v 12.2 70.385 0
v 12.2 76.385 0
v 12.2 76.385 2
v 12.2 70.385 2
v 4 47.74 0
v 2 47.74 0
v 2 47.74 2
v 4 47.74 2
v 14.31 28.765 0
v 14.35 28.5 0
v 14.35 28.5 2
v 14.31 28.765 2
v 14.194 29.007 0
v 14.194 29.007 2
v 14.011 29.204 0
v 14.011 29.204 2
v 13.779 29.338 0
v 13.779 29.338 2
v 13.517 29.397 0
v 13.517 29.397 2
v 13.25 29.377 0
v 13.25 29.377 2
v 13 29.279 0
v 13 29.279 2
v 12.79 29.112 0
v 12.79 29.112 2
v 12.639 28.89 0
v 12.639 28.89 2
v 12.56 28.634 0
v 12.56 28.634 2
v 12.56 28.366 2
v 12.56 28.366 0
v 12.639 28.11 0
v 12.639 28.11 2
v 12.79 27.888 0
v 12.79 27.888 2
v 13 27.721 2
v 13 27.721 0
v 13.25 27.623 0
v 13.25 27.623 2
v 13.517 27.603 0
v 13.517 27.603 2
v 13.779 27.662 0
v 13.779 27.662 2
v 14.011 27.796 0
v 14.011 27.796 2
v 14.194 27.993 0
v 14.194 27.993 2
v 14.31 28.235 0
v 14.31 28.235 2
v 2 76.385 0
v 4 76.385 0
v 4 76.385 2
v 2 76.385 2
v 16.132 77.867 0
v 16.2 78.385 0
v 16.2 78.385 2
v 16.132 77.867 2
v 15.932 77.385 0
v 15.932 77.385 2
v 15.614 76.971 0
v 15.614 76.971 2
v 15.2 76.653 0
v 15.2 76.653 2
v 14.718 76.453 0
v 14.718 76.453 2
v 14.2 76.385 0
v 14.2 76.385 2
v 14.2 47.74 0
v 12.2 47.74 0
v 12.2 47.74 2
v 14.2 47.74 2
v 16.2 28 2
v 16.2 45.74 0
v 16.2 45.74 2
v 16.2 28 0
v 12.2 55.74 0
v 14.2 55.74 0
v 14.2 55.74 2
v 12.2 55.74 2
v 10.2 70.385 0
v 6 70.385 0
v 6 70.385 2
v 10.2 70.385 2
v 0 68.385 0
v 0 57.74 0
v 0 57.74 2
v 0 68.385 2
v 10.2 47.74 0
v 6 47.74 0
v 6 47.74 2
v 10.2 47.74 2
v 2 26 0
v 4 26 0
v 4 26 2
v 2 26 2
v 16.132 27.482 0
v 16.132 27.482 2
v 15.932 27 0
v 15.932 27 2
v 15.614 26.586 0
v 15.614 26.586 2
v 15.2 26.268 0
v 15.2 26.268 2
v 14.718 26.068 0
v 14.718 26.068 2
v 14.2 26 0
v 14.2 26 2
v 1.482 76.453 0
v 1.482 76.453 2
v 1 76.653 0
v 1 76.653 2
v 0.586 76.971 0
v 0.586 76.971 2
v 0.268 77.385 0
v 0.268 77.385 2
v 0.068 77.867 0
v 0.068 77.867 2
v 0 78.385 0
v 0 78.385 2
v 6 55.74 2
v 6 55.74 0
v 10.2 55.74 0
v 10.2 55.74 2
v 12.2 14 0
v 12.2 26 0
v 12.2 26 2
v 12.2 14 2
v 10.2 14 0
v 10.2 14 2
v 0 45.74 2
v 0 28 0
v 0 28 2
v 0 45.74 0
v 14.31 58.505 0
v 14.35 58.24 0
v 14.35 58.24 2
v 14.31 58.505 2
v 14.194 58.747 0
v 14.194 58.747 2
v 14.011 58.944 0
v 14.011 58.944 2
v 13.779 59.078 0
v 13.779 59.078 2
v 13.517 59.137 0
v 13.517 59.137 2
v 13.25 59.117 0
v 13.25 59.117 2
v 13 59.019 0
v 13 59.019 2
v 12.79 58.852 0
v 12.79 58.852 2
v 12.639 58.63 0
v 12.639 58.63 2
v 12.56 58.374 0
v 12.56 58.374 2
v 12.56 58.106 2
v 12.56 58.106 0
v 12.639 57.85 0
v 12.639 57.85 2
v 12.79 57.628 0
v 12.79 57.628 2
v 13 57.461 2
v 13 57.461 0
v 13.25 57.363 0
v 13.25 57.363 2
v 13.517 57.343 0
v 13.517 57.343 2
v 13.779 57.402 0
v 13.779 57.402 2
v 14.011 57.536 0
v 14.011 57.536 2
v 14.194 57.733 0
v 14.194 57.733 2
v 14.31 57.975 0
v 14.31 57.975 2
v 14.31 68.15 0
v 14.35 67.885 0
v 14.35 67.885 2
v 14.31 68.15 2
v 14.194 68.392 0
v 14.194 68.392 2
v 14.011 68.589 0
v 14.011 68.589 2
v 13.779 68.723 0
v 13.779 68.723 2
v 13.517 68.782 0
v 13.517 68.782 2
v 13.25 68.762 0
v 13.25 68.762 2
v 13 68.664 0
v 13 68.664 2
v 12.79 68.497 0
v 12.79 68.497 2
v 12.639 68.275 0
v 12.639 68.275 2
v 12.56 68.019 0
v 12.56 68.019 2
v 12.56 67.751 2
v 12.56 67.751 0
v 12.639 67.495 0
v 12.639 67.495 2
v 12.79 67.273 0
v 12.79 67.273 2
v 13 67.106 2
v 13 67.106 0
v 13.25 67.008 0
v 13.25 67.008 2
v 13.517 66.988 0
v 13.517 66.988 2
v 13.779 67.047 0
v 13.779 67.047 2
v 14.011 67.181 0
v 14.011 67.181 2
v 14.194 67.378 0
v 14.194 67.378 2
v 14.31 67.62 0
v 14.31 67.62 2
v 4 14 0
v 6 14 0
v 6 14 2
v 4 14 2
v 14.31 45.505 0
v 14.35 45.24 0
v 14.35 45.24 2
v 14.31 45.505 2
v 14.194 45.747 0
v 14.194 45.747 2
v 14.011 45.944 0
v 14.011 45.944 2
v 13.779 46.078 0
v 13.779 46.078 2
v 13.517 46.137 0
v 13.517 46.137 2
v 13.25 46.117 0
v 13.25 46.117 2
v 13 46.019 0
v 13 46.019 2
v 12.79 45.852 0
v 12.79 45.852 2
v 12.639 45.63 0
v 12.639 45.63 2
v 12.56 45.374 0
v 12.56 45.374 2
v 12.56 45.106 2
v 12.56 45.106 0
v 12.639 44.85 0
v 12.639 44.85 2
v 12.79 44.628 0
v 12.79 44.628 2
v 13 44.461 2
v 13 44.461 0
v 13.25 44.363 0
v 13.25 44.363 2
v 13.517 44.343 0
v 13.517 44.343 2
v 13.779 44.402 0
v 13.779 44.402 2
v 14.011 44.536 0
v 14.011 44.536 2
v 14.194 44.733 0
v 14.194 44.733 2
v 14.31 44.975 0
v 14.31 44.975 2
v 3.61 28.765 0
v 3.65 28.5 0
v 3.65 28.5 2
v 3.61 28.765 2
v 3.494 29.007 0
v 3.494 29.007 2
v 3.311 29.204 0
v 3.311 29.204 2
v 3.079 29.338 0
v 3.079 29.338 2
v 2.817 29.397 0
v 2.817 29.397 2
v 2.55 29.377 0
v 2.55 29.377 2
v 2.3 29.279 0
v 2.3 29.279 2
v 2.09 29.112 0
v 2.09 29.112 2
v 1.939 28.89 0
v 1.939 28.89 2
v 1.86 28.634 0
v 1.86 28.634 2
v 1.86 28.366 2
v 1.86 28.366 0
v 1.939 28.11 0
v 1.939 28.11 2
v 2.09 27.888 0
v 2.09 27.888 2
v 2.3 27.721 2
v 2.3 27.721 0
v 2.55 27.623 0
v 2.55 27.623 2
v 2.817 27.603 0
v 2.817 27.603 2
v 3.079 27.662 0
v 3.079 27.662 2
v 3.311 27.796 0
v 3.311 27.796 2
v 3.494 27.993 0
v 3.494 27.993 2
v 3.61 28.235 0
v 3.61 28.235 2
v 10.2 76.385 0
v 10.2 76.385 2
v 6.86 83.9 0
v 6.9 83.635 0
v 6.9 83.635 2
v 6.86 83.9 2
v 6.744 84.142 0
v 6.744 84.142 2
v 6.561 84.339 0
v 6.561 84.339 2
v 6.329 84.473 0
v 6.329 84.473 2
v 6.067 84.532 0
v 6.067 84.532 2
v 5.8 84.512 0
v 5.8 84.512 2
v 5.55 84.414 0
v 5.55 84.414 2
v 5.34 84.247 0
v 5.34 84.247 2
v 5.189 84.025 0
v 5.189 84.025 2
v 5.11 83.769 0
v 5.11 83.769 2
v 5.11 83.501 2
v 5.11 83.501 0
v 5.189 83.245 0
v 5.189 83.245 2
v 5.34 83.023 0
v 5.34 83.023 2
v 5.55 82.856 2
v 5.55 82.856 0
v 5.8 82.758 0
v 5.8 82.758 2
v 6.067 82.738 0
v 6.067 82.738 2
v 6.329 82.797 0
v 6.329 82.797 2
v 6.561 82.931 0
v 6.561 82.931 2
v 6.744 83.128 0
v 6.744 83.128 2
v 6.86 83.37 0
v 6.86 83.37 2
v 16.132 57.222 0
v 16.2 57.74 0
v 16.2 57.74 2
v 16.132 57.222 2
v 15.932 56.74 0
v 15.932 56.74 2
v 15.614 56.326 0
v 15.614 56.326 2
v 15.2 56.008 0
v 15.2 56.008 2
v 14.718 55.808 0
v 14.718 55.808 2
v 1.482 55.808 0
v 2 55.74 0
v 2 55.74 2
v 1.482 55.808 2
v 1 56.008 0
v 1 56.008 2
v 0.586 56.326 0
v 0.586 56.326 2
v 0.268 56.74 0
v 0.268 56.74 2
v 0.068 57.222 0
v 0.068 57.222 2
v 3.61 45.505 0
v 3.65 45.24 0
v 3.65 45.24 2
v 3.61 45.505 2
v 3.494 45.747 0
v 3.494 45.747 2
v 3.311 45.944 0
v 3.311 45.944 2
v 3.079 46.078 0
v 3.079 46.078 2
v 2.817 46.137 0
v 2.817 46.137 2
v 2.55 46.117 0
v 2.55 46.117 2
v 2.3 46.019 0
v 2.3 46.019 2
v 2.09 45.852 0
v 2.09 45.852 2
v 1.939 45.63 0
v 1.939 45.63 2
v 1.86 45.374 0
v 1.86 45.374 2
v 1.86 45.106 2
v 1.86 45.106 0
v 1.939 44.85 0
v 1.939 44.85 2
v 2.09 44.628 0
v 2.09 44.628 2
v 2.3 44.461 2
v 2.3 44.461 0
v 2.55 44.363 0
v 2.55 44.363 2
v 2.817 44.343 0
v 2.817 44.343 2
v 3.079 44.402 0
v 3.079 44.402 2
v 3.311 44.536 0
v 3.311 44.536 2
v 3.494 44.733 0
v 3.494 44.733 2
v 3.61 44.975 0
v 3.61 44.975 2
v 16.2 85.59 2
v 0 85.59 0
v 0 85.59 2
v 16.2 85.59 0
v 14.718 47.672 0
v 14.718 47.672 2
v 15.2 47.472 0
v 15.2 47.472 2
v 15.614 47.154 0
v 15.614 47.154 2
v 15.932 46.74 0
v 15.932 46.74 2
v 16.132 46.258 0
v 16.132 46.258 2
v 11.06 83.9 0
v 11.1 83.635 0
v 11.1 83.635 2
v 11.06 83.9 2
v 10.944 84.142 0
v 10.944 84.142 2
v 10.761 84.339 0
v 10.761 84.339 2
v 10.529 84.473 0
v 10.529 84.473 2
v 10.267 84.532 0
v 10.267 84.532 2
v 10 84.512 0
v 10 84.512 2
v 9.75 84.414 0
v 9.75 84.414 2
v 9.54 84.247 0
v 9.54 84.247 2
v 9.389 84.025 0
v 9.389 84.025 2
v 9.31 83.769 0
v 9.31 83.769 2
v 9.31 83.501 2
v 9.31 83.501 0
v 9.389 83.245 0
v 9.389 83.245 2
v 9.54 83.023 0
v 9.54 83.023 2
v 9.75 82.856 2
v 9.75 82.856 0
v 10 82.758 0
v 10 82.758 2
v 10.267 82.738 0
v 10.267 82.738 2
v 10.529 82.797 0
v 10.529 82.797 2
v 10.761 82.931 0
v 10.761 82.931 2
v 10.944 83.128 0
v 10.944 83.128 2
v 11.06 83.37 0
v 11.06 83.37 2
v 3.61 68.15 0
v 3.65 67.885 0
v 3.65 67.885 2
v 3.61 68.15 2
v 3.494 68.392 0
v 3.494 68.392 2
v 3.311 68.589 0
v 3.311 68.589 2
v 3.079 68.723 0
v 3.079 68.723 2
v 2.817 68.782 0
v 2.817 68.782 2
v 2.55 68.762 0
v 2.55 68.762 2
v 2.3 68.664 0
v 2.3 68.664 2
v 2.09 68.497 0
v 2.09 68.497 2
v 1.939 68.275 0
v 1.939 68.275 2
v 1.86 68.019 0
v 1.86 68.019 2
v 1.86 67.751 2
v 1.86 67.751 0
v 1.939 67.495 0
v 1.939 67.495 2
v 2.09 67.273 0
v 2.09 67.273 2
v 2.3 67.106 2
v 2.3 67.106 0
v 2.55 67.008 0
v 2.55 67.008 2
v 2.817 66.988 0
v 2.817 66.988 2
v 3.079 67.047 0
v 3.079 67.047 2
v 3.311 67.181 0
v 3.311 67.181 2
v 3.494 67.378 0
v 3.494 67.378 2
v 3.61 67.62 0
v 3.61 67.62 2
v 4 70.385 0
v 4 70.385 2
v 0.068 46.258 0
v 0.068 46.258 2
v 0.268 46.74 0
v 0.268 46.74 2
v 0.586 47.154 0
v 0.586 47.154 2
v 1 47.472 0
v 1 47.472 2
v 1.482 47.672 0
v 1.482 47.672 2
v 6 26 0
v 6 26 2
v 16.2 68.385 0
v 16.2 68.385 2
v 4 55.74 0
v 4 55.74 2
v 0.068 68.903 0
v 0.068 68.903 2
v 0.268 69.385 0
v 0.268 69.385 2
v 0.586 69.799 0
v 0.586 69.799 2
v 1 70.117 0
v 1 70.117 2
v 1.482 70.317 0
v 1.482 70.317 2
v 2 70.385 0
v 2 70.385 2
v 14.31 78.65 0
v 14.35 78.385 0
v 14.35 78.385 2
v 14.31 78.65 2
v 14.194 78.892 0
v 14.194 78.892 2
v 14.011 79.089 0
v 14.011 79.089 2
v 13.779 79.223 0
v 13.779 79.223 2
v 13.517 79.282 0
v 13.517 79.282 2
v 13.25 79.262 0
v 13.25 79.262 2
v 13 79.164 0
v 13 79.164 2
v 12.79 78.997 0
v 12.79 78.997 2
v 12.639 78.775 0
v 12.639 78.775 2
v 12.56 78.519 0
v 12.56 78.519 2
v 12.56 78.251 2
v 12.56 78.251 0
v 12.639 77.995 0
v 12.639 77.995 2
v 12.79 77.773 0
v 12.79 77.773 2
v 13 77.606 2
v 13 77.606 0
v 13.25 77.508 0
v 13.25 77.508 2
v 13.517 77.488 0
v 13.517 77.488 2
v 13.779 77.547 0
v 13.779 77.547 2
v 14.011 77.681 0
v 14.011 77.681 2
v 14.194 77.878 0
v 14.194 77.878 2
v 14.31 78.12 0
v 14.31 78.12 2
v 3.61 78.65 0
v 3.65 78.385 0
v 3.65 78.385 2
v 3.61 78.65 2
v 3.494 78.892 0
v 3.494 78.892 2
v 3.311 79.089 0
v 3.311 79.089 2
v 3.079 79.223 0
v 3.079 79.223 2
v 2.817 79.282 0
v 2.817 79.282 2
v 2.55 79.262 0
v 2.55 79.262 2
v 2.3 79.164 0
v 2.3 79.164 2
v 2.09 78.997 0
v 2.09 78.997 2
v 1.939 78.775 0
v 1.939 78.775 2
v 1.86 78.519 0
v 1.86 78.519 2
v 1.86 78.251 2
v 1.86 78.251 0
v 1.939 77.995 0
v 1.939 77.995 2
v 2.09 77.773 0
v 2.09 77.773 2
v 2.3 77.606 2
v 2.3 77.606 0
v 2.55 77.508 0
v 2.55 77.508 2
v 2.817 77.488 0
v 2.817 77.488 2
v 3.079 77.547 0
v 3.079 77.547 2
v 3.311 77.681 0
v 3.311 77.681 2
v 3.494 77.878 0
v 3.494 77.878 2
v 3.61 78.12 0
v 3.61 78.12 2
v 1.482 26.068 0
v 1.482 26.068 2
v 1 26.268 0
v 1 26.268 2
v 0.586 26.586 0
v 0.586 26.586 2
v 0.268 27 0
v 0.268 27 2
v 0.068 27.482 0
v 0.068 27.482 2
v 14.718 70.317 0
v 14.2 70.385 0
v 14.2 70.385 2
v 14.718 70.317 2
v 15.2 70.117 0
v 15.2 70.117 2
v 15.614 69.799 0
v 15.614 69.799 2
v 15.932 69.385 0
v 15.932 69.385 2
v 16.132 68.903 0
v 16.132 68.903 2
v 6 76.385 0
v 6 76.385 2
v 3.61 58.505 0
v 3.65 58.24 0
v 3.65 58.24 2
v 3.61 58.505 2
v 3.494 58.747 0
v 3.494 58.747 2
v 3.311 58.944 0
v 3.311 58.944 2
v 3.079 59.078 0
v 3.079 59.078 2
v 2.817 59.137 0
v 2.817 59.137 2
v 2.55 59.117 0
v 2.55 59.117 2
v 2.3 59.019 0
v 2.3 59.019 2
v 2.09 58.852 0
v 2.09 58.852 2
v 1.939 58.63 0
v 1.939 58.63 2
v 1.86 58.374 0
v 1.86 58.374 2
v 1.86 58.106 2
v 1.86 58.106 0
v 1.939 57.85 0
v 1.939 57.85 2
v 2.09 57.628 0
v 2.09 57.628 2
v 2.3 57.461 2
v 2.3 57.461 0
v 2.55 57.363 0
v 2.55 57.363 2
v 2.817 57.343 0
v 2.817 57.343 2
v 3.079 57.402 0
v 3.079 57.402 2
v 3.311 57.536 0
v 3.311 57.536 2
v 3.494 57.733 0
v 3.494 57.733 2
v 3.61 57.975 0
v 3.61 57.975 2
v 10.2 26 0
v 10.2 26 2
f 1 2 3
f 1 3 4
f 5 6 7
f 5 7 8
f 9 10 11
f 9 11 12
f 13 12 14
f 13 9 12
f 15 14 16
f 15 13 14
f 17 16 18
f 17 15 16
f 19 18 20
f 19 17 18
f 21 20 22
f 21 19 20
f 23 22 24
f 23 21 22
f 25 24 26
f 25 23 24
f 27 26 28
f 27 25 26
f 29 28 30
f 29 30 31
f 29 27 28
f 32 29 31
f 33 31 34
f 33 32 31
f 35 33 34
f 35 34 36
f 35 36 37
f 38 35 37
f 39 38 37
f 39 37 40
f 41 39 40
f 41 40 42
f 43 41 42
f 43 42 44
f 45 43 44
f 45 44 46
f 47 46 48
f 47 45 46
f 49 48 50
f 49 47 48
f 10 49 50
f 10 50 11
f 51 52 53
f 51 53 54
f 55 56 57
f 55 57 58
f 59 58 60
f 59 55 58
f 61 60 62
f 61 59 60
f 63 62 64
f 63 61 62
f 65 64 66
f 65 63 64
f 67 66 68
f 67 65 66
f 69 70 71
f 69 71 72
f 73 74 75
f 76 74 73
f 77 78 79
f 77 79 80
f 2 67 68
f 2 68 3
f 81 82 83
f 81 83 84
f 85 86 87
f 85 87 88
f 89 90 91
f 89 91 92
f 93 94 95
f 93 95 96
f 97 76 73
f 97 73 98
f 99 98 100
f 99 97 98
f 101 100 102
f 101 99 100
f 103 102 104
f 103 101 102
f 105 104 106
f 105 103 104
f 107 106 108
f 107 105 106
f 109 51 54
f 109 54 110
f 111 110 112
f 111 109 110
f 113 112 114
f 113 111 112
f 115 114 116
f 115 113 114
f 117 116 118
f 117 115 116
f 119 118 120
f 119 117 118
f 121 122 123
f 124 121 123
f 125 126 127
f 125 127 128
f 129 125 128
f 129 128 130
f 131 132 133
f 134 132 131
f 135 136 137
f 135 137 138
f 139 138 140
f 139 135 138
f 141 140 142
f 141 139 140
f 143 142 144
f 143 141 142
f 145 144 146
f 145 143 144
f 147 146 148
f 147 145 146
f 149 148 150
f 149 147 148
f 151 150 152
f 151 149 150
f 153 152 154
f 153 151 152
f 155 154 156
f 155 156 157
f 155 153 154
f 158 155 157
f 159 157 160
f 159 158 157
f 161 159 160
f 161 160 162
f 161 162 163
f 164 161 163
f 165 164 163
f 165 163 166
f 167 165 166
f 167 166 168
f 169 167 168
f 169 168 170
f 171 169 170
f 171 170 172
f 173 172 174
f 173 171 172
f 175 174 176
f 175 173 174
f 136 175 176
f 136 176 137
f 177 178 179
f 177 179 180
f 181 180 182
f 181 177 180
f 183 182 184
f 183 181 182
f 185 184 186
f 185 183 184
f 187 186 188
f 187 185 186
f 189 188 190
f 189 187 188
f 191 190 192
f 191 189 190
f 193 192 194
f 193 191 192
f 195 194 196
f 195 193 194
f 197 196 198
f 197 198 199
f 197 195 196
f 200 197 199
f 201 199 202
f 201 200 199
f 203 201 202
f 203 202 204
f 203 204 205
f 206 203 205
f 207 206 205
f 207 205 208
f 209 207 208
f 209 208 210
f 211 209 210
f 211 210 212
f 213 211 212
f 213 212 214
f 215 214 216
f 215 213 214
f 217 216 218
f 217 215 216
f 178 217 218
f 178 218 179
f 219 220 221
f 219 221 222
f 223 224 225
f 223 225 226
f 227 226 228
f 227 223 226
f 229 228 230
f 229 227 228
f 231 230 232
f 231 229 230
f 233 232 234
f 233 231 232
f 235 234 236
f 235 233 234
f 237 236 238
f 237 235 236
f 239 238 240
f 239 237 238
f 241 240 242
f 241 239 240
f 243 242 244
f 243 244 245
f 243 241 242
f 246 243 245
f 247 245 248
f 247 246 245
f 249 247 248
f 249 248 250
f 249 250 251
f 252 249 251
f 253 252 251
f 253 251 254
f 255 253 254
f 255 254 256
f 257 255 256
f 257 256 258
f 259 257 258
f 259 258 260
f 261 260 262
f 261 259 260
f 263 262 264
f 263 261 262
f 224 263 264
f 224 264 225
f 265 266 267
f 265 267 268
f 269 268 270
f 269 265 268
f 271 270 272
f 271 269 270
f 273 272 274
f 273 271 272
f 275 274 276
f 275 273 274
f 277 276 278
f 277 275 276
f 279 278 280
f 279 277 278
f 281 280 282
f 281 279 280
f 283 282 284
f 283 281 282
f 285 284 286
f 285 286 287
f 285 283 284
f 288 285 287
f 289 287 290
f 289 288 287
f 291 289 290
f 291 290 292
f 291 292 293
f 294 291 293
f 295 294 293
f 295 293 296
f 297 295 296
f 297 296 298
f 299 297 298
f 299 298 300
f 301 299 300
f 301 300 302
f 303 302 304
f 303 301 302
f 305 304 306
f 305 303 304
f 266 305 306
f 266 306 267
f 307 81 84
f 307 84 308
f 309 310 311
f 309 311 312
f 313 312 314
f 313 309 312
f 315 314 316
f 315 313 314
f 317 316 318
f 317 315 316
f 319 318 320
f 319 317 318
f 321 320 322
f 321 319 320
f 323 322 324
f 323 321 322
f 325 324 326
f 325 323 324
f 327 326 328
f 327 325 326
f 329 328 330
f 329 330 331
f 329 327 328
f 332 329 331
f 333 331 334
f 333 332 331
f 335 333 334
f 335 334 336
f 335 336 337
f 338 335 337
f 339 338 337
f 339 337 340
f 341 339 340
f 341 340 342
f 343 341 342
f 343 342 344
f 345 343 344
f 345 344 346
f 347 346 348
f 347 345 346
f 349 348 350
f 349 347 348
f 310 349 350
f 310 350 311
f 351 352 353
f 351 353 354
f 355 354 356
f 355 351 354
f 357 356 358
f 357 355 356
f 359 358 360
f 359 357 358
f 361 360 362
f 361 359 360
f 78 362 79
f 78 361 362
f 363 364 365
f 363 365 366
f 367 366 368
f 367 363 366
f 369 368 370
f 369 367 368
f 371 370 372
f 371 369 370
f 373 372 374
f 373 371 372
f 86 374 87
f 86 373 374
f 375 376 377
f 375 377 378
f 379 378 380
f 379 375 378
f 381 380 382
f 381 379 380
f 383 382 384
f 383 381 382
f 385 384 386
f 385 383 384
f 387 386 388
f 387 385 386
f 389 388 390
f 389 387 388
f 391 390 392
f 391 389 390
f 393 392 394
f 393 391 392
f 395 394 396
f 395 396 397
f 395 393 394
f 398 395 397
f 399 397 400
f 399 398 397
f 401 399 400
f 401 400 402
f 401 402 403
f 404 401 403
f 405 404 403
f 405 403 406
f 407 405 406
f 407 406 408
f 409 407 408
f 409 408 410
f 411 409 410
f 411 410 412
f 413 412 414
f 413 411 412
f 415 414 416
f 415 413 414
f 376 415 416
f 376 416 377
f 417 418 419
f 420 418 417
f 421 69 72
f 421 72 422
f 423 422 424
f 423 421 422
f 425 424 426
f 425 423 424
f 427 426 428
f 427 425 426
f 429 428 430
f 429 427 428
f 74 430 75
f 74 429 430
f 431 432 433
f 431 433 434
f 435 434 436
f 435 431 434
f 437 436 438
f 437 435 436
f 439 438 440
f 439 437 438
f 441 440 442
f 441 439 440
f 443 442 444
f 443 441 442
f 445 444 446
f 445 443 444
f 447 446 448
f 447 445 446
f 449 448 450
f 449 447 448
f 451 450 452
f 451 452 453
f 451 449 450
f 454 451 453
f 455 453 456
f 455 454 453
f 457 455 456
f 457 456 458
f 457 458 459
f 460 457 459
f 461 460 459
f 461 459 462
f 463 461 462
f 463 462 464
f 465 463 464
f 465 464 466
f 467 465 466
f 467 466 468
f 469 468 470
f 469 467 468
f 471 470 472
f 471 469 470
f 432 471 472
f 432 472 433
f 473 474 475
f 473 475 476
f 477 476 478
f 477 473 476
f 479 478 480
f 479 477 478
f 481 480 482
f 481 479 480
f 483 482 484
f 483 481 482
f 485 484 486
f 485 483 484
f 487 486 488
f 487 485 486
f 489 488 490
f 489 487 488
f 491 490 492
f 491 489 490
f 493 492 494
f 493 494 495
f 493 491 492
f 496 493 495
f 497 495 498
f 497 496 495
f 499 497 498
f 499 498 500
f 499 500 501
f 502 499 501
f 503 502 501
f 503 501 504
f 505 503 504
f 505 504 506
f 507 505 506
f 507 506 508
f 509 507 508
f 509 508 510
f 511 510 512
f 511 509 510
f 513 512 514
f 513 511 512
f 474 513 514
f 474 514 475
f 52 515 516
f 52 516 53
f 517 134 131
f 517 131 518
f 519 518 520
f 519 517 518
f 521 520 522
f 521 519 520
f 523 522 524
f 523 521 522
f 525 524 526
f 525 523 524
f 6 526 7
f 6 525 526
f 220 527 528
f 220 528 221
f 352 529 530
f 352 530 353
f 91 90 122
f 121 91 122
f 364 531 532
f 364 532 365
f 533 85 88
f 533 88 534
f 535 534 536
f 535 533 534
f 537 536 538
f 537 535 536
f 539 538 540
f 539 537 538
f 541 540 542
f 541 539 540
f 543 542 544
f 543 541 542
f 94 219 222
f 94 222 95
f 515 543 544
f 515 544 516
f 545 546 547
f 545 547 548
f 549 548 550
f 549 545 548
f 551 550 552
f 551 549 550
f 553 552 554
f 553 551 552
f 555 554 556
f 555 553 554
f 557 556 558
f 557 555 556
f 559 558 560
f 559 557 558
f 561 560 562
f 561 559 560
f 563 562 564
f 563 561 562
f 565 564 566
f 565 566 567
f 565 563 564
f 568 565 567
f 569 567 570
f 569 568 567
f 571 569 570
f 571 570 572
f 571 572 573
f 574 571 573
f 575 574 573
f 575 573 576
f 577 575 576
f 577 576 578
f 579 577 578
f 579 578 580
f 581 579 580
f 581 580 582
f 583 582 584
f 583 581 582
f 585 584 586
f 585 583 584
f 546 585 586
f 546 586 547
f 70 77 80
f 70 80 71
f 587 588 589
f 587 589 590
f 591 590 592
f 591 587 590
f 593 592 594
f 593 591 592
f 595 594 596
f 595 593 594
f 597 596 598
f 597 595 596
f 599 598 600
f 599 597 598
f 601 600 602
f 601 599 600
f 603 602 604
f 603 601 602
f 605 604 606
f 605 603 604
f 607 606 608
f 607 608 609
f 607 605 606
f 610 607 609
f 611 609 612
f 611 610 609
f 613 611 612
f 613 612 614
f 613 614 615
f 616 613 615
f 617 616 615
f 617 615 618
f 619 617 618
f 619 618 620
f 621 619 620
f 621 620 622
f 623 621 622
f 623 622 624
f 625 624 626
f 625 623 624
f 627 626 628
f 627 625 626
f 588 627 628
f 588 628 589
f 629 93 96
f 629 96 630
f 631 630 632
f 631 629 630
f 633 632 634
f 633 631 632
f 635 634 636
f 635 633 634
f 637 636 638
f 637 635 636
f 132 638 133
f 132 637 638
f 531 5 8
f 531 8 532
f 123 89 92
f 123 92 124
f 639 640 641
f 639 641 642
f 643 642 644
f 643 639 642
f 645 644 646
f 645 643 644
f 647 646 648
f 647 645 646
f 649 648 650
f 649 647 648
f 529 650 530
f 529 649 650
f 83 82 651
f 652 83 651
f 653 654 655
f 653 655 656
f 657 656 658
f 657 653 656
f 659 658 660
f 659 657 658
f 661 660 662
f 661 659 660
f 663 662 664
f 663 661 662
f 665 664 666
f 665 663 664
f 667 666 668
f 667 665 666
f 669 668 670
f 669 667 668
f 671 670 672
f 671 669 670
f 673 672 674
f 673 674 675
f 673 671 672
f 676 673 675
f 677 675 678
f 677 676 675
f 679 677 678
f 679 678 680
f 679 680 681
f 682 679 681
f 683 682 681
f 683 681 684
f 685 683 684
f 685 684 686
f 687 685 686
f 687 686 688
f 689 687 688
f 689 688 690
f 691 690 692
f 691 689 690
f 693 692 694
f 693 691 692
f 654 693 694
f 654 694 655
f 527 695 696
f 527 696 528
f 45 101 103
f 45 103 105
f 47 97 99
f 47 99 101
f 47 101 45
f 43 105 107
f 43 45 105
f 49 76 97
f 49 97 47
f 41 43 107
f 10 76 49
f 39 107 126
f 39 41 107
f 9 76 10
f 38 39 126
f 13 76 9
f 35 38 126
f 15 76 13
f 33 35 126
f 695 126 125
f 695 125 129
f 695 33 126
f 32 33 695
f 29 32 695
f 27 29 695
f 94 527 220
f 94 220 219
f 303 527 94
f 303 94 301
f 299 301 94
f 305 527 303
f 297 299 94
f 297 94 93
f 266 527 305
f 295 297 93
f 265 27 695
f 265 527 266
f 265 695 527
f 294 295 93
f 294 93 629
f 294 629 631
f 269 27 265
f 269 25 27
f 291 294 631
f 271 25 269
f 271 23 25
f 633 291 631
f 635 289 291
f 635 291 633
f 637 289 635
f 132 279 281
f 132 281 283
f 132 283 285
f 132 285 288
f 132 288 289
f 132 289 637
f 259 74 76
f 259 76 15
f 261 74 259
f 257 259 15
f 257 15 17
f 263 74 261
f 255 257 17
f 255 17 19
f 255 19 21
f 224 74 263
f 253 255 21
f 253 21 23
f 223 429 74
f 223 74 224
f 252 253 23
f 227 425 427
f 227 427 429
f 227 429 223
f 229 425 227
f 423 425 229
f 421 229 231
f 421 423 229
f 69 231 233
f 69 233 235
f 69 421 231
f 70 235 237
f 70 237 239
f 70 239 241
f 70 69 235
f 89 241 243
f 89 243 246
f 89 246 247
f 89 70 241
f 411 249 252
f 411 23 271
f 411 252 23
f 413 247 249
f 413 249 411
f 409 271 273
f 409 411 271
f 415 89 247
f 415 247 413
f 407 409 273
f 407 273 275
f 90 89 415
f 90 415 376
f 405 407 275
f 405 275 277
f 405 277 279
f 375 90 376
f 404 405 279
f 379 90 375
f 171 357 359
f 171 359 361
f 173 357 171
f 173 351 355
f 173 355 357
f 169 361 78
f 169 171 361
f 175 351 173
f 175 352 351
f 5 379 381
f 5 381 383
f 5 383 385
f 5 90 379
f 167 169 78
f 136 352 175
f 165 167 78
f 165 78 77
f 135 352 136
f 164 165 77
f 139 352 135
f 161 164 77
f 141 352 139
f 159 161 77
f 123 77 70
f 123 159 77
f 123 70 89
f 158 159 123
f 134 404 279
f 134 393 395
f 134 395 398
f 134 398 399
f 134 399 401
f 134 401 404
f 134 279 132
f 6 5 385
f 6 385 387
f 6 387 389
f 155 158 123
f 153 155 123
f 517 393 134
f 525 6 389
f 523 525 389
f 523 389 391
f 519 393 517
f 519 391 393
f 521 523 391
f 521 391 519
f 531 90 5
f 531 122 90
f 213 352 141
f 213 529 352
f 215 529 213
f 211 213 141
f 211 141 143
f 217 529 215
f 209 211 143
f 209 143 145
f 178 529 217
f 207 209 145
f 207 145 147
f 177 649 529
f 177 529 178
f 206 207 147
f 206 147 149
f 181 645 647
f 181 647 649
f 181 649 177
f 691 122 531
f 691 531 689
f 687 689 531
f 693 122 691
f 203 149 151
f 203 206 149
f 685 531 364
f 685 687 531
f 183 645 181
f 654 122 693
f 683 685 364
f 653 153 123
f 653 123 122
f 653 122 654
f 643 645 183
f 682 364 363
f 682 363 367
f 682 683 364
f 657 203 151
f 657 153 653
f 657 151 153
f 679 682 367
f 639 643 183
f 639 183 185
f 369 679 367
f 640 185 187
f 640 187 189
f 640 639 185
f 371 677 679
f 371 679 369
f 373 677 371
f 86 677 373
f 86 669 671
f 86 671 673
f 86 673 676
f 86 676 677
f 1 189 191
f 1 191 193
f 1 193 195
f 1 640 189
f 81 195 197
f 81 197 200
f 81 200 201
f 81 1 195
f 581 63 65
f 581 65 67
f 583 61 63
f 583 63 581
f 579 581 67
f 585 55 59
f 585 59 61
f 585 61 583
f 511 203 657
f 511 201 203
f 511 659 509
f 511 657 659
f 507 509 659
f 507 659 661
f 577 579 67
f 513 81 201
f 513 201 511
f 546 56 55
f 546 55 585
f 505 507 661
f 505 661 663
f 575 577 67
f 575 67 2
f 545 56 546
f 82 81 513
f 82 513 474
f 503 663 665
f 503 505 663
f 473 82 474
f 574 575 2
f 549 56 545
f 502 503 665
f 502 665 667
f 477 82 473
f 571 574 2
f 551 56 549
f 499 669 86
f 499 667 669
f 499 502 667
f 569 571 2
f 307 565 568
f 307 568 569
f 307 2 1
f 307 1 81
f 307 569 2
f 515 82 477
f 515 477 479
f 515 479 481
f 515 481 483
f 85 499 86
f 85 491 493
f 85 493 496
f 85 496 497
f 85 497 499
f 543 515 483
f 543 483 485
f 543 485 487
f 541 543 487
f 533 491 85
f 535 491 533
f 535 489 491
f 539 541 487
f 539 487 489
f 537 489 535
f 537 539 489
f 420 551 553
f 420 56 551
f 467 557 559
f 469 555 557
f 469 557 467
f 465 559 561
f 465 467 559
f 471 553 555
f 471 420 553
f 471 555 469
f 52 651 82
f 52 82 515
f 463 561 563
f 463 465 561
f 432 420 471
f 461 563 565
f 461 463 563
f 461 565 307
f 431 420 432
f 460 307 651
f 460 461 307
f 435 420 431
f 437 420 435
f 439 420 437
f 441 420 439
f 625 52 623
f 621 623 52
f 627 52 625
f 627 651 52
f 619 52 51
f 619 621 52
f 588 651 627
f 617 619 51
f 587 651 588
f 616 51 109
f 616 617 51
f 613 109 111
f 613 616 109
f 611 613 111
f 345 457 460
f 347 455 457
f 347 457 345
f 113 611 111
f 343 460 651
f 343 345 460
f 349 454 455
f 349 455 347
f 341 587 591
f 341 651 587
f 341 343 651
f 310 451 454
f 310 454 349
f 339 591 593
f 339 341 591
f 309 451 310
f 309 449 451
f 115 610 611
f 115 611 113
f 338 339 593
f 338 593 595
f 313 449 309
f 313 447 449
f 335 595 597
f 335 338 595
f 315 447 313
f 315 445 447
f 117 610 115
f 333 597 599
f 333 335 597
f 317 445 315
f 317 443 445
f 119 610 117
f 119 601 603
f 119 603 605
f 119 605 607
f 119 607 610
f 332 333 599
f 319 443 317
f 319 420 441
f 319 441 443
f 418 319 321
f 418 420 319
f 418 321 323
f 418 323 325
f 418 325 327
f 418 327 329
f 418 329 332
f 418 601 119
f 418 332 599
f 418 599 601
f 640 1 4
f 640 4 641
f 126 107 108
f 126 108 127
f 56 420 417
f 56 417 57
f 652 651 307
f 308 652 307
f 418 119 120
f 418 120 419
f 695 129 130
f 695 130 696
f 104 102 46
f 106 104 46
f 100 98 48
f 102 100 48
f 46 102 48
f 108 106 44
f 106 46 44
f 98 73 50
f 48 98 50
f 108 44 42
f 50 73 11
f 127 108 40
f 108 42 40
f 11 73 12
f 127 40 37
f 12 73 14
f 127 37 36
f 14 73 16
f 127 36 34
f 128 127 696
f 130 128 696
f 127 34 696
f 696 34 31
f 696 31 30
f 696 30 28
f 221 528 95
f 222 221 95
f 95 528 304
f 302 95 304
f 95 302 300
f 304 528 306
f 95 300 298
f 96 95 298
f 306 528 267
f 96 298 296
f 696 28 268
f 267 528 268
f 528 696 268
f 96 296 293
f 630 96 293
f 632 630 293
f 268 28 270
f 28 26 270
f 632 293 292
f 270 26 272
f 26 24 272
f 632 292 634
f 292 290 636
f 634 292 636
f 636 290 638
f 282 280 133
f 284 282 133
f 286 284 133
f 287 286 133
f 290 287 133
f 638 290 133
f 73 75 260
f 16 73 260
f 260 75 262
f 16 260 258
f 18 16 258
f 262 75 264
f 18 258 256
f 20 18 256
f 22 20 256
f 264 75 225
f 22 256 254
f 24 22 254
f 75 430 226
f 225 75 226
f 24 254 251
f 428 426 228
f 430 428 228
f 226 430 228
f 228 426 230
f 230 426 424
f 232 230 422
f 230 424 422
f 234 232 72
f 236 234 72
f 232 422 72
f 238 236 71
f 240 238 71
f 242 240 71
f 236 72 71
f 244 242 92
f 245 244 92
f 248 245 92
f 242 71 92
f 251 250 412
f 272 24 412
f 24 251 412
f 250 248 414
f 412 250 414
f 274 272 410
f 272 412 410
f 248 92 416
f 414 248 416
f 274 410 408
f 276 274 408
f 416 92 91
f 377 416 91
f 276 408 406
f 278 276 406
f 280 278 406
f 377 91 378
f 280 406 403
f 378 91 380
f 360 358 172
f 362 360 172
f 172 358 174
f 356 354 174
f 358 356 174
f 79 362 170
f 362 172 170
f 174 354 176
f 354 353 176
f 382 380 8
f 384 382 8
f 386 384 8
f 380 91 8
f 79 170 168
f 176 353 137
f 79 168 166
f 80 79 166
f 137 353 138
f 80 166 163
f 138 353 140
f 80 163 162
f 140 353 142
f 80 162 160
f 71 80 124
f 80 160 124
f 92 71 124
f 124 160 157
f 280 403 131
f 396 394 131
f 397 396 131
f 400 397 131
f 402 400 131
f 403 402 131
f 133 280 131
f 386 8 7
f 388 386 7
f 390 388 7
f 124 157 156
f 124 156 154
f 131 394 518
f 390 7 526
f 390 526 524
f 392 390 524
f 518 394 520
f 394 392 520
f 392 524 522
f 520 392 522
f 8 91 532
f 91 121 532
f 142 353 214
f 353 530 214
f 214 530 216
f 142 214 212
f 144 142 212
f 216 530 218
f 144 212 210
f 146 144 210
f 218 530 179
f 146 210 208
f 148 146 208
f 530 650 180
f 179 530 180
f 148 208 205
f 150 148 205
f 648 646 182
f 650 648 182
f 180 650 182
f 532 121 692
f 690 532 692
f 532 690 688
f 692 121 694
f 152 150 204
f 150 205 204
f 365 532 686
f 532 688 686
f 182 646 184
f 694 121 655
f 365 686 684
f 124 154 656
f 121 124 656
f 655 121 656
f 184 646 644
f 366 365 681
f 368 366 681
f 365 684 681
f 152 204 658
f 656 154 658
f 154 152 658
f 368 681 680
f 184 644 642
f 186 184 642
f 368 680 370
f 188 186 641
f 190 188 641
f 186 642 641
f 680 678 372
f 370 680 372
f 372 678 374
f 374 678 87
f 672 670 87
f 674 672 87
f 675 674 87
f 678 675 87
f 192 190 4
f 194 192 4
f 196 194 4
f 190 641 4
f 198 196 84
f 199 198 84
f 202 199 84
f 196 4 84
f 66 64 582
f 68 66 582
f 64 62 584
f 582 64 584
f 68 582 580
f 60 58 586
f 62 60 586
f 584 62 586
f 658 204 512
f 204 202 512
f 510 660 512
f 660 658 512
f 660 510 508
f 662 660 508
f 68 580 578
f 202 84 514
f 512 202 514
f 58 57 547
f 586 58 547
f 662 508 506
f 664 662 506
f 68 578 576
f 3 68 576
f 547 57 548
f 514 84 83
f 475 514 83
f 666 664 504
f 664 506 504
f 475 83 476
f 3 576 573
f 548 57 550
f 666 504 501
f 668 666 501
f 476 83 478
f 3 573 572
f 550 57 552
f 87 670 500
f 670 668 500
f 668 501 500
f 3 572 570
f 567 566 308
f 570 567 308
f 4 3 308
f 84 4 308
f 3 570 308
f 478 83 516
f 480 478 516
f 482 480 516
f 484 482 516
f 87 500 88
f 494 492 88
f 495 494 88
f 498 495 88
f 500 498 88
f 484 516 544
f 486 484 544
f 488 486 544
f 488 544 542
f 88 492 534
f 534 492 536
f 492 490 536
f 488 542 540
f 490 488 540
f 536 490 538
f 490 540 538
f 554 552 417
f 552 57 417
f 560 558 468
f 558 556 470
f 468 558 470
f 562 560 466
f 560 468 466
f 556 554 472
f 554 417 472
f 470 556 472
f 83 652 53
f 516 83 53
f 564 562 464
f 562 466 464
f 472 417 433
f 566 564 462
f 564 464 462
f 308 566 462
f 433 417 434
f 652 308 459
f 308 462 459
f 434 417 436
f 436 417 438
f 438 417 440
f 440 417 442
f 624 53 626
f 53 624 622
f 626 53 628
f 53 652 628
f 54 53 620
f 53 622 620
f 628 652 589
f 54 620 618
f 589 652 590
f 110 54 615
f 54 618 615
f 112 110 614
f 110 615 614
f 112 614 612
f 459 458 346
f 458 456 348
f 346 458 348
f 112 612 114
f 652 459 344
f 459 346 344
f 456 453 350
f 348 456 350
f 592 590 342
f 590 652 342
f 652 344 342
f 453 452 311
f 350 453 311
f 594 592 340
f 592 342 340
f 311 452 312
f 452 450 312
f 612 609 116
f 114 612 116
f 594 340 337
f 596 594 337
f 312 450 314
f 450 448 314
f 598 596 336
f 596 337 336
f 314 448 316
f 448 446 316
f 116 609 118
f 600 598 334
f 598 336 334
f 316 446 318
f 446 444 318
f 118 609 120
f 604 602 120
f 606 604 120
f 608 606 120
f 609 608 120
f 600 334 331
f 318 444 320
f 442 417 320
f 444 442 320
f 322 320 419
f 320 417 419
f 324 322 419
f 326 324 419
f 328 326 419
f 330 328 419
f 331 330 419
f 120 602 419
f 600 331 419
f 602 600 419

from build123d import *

# Parameters (mm, degrees)
SKETCH1_R           = 0.9
SKETCH1_W           = 4.2
SKETCH1_H           = 6
SKETCH1_H_2         = 8
BOSS_EXTRUDE1_DEPTH = 2


with BuildPart() as part:
    # Sketch1 → Boss-Extrude1 (new body)
    with BuildSketch(Plane.XY):
        with BuildLine():
            Line((2, 47.74), (4, 47.74))
            Line((4, 47.74), (4, 55.74))
            Line((4, 55.74), (2, 55.74))
            ThreePointArc((2, 55.74), (0.585786438, 56.325786438), (0, 57.74))
            Line((0, 57.74), (0, 68.385))
            ThreePointArc((0, 68.385), (0.585786438, 69.799213562), (2, 70.385))
            Line((2, 70.385), (4, 70.385))
            Line((4, 70.385), (4, 76.385))
            Line((4, 76.385), (2, 76.385))
            ThreePointArc((2, 76.385), (0.585786438, 76.970786438), (0, 78.385))
            Line((0, 78.385), (0, 85.59))
            Line((0, 85.59), (16.2, 85.59))
            Line((16.2, 85.59), (16.2, 78.385))
            ThreePointArc((16.2, 78.385), (15.614213562, 76.970786438), (14.2, 76.385))
            Line((14.2, 76.385), (12.2, 76.385))
            Line((12.2, 76.385), (12.2, 70.385))
            Line((12.2, 70.385), (14.2, 70.385))
            ThreePointArc((14.2, 70.385), (15.614213562, 69.799213562), (16.2, 68.385))
            Line((16.2, 68.385), (16.2, 57.74))
            ThreePointArc((16.2, 57.74), (15.614213562, 56.325786438), (14.2, 55.74))
            Line((14.2, 55.74), (12.2, 55.74))
            Line((12.2, 55.74), (12.2, 47.74))
            Line((12.2, 47.74), (14.2, 47.74))
            ThreePointArc((14.2, 47.74), (15.614213562, 47.154213562), (16.2, 45.74))
            Line((16.2, 45.74), (16.2, 28))
            ThreePointArc((16.2, 28), (15.614213562, 26.585786438), (14.2, 26))
            Line((14.2, 26), (12.2, 26))
            Line((12.2, 26), (12.2, 14))
            Line((12.2, 14), (10.2, 14))
            Line((10.2, 14), (10.2, 26))
            Line((10.2, 26), (6, 26))
            Line((6, 26), (6, 14))
            Line((6, 14), (4, 14))
            Line((4, 14), (4, 26))
            Line((4, 26), (2, 26))
            ThreePointArc((2, 26), (0.585786438, 26.585786438), (0, 28))
            Line((0, 28), (0, 45.74))
            ThreePointArc((0, 45.74), (0.585786438, 47.154213562), (2, 47.74))
        make_face()
        with Locations((13.45, 45.24)):
            Circle(SKETCH1_R, mode=Mode.SUBTRACT)
        with Locations((2.75, 67.885)):
            Circle(SKETCH1_R, mode=Mode.SUBTRACT)
        with Locations((13.45, 58.24)):
            Circle(SKETCH1_R, mode=Mode.SUBTRACT)
        with Locations((13.45, 78.385)):
            Circle(SKETCH1_R, mode=Mode.SUBTRACT)
        with Locations((2.75, 28.5)):
            Circle(SKETCH1_R, mode=Mode.SUBTRACT)
        with Locations((2.75, 78.385)):
            Circle(SKETCH1_R, mode=Mode.SUBTRACT)
        with Locations((2.75, 58.24)):
            Circle(SKETCH1_R, mode=Mode.SUBTRACT)
        with Locations((6, 83.635)):
            Circle(SKETCH1_R, mode=Mode.SUBTRACT)
        with Locations((13.45, 28.5)):
            Circle(SKETCH1_R, mode=Mode.SUBTRACT)
        with Locations((13.45, 67.885)):
            Circle(SKETCH1_R, mode=Mode.SUBTRACT)
        with Locations((10.2, 83.635)):
            Circle(SKETCH1_R, mode=Mode.SUBTRACT)
        with Locations((2.75, 45.24)):
            Circle(SKETCH1_R, mode=Mode.SUBTRACT)
        with Locations((8.1, 73.385)):
            Rectangle(SKETCH1_W, SKETCH1_H, mode=Mode.SUBTRACT)
        with Locations((8.1, 51.74)):
            Rectangle(SKETCH1_W, SKETCH1_H_2, mode=Mode.SUBTRACT)
    extrude(amount=BOSS_EXTRUDE1_DEPTH)


solid = part.part
